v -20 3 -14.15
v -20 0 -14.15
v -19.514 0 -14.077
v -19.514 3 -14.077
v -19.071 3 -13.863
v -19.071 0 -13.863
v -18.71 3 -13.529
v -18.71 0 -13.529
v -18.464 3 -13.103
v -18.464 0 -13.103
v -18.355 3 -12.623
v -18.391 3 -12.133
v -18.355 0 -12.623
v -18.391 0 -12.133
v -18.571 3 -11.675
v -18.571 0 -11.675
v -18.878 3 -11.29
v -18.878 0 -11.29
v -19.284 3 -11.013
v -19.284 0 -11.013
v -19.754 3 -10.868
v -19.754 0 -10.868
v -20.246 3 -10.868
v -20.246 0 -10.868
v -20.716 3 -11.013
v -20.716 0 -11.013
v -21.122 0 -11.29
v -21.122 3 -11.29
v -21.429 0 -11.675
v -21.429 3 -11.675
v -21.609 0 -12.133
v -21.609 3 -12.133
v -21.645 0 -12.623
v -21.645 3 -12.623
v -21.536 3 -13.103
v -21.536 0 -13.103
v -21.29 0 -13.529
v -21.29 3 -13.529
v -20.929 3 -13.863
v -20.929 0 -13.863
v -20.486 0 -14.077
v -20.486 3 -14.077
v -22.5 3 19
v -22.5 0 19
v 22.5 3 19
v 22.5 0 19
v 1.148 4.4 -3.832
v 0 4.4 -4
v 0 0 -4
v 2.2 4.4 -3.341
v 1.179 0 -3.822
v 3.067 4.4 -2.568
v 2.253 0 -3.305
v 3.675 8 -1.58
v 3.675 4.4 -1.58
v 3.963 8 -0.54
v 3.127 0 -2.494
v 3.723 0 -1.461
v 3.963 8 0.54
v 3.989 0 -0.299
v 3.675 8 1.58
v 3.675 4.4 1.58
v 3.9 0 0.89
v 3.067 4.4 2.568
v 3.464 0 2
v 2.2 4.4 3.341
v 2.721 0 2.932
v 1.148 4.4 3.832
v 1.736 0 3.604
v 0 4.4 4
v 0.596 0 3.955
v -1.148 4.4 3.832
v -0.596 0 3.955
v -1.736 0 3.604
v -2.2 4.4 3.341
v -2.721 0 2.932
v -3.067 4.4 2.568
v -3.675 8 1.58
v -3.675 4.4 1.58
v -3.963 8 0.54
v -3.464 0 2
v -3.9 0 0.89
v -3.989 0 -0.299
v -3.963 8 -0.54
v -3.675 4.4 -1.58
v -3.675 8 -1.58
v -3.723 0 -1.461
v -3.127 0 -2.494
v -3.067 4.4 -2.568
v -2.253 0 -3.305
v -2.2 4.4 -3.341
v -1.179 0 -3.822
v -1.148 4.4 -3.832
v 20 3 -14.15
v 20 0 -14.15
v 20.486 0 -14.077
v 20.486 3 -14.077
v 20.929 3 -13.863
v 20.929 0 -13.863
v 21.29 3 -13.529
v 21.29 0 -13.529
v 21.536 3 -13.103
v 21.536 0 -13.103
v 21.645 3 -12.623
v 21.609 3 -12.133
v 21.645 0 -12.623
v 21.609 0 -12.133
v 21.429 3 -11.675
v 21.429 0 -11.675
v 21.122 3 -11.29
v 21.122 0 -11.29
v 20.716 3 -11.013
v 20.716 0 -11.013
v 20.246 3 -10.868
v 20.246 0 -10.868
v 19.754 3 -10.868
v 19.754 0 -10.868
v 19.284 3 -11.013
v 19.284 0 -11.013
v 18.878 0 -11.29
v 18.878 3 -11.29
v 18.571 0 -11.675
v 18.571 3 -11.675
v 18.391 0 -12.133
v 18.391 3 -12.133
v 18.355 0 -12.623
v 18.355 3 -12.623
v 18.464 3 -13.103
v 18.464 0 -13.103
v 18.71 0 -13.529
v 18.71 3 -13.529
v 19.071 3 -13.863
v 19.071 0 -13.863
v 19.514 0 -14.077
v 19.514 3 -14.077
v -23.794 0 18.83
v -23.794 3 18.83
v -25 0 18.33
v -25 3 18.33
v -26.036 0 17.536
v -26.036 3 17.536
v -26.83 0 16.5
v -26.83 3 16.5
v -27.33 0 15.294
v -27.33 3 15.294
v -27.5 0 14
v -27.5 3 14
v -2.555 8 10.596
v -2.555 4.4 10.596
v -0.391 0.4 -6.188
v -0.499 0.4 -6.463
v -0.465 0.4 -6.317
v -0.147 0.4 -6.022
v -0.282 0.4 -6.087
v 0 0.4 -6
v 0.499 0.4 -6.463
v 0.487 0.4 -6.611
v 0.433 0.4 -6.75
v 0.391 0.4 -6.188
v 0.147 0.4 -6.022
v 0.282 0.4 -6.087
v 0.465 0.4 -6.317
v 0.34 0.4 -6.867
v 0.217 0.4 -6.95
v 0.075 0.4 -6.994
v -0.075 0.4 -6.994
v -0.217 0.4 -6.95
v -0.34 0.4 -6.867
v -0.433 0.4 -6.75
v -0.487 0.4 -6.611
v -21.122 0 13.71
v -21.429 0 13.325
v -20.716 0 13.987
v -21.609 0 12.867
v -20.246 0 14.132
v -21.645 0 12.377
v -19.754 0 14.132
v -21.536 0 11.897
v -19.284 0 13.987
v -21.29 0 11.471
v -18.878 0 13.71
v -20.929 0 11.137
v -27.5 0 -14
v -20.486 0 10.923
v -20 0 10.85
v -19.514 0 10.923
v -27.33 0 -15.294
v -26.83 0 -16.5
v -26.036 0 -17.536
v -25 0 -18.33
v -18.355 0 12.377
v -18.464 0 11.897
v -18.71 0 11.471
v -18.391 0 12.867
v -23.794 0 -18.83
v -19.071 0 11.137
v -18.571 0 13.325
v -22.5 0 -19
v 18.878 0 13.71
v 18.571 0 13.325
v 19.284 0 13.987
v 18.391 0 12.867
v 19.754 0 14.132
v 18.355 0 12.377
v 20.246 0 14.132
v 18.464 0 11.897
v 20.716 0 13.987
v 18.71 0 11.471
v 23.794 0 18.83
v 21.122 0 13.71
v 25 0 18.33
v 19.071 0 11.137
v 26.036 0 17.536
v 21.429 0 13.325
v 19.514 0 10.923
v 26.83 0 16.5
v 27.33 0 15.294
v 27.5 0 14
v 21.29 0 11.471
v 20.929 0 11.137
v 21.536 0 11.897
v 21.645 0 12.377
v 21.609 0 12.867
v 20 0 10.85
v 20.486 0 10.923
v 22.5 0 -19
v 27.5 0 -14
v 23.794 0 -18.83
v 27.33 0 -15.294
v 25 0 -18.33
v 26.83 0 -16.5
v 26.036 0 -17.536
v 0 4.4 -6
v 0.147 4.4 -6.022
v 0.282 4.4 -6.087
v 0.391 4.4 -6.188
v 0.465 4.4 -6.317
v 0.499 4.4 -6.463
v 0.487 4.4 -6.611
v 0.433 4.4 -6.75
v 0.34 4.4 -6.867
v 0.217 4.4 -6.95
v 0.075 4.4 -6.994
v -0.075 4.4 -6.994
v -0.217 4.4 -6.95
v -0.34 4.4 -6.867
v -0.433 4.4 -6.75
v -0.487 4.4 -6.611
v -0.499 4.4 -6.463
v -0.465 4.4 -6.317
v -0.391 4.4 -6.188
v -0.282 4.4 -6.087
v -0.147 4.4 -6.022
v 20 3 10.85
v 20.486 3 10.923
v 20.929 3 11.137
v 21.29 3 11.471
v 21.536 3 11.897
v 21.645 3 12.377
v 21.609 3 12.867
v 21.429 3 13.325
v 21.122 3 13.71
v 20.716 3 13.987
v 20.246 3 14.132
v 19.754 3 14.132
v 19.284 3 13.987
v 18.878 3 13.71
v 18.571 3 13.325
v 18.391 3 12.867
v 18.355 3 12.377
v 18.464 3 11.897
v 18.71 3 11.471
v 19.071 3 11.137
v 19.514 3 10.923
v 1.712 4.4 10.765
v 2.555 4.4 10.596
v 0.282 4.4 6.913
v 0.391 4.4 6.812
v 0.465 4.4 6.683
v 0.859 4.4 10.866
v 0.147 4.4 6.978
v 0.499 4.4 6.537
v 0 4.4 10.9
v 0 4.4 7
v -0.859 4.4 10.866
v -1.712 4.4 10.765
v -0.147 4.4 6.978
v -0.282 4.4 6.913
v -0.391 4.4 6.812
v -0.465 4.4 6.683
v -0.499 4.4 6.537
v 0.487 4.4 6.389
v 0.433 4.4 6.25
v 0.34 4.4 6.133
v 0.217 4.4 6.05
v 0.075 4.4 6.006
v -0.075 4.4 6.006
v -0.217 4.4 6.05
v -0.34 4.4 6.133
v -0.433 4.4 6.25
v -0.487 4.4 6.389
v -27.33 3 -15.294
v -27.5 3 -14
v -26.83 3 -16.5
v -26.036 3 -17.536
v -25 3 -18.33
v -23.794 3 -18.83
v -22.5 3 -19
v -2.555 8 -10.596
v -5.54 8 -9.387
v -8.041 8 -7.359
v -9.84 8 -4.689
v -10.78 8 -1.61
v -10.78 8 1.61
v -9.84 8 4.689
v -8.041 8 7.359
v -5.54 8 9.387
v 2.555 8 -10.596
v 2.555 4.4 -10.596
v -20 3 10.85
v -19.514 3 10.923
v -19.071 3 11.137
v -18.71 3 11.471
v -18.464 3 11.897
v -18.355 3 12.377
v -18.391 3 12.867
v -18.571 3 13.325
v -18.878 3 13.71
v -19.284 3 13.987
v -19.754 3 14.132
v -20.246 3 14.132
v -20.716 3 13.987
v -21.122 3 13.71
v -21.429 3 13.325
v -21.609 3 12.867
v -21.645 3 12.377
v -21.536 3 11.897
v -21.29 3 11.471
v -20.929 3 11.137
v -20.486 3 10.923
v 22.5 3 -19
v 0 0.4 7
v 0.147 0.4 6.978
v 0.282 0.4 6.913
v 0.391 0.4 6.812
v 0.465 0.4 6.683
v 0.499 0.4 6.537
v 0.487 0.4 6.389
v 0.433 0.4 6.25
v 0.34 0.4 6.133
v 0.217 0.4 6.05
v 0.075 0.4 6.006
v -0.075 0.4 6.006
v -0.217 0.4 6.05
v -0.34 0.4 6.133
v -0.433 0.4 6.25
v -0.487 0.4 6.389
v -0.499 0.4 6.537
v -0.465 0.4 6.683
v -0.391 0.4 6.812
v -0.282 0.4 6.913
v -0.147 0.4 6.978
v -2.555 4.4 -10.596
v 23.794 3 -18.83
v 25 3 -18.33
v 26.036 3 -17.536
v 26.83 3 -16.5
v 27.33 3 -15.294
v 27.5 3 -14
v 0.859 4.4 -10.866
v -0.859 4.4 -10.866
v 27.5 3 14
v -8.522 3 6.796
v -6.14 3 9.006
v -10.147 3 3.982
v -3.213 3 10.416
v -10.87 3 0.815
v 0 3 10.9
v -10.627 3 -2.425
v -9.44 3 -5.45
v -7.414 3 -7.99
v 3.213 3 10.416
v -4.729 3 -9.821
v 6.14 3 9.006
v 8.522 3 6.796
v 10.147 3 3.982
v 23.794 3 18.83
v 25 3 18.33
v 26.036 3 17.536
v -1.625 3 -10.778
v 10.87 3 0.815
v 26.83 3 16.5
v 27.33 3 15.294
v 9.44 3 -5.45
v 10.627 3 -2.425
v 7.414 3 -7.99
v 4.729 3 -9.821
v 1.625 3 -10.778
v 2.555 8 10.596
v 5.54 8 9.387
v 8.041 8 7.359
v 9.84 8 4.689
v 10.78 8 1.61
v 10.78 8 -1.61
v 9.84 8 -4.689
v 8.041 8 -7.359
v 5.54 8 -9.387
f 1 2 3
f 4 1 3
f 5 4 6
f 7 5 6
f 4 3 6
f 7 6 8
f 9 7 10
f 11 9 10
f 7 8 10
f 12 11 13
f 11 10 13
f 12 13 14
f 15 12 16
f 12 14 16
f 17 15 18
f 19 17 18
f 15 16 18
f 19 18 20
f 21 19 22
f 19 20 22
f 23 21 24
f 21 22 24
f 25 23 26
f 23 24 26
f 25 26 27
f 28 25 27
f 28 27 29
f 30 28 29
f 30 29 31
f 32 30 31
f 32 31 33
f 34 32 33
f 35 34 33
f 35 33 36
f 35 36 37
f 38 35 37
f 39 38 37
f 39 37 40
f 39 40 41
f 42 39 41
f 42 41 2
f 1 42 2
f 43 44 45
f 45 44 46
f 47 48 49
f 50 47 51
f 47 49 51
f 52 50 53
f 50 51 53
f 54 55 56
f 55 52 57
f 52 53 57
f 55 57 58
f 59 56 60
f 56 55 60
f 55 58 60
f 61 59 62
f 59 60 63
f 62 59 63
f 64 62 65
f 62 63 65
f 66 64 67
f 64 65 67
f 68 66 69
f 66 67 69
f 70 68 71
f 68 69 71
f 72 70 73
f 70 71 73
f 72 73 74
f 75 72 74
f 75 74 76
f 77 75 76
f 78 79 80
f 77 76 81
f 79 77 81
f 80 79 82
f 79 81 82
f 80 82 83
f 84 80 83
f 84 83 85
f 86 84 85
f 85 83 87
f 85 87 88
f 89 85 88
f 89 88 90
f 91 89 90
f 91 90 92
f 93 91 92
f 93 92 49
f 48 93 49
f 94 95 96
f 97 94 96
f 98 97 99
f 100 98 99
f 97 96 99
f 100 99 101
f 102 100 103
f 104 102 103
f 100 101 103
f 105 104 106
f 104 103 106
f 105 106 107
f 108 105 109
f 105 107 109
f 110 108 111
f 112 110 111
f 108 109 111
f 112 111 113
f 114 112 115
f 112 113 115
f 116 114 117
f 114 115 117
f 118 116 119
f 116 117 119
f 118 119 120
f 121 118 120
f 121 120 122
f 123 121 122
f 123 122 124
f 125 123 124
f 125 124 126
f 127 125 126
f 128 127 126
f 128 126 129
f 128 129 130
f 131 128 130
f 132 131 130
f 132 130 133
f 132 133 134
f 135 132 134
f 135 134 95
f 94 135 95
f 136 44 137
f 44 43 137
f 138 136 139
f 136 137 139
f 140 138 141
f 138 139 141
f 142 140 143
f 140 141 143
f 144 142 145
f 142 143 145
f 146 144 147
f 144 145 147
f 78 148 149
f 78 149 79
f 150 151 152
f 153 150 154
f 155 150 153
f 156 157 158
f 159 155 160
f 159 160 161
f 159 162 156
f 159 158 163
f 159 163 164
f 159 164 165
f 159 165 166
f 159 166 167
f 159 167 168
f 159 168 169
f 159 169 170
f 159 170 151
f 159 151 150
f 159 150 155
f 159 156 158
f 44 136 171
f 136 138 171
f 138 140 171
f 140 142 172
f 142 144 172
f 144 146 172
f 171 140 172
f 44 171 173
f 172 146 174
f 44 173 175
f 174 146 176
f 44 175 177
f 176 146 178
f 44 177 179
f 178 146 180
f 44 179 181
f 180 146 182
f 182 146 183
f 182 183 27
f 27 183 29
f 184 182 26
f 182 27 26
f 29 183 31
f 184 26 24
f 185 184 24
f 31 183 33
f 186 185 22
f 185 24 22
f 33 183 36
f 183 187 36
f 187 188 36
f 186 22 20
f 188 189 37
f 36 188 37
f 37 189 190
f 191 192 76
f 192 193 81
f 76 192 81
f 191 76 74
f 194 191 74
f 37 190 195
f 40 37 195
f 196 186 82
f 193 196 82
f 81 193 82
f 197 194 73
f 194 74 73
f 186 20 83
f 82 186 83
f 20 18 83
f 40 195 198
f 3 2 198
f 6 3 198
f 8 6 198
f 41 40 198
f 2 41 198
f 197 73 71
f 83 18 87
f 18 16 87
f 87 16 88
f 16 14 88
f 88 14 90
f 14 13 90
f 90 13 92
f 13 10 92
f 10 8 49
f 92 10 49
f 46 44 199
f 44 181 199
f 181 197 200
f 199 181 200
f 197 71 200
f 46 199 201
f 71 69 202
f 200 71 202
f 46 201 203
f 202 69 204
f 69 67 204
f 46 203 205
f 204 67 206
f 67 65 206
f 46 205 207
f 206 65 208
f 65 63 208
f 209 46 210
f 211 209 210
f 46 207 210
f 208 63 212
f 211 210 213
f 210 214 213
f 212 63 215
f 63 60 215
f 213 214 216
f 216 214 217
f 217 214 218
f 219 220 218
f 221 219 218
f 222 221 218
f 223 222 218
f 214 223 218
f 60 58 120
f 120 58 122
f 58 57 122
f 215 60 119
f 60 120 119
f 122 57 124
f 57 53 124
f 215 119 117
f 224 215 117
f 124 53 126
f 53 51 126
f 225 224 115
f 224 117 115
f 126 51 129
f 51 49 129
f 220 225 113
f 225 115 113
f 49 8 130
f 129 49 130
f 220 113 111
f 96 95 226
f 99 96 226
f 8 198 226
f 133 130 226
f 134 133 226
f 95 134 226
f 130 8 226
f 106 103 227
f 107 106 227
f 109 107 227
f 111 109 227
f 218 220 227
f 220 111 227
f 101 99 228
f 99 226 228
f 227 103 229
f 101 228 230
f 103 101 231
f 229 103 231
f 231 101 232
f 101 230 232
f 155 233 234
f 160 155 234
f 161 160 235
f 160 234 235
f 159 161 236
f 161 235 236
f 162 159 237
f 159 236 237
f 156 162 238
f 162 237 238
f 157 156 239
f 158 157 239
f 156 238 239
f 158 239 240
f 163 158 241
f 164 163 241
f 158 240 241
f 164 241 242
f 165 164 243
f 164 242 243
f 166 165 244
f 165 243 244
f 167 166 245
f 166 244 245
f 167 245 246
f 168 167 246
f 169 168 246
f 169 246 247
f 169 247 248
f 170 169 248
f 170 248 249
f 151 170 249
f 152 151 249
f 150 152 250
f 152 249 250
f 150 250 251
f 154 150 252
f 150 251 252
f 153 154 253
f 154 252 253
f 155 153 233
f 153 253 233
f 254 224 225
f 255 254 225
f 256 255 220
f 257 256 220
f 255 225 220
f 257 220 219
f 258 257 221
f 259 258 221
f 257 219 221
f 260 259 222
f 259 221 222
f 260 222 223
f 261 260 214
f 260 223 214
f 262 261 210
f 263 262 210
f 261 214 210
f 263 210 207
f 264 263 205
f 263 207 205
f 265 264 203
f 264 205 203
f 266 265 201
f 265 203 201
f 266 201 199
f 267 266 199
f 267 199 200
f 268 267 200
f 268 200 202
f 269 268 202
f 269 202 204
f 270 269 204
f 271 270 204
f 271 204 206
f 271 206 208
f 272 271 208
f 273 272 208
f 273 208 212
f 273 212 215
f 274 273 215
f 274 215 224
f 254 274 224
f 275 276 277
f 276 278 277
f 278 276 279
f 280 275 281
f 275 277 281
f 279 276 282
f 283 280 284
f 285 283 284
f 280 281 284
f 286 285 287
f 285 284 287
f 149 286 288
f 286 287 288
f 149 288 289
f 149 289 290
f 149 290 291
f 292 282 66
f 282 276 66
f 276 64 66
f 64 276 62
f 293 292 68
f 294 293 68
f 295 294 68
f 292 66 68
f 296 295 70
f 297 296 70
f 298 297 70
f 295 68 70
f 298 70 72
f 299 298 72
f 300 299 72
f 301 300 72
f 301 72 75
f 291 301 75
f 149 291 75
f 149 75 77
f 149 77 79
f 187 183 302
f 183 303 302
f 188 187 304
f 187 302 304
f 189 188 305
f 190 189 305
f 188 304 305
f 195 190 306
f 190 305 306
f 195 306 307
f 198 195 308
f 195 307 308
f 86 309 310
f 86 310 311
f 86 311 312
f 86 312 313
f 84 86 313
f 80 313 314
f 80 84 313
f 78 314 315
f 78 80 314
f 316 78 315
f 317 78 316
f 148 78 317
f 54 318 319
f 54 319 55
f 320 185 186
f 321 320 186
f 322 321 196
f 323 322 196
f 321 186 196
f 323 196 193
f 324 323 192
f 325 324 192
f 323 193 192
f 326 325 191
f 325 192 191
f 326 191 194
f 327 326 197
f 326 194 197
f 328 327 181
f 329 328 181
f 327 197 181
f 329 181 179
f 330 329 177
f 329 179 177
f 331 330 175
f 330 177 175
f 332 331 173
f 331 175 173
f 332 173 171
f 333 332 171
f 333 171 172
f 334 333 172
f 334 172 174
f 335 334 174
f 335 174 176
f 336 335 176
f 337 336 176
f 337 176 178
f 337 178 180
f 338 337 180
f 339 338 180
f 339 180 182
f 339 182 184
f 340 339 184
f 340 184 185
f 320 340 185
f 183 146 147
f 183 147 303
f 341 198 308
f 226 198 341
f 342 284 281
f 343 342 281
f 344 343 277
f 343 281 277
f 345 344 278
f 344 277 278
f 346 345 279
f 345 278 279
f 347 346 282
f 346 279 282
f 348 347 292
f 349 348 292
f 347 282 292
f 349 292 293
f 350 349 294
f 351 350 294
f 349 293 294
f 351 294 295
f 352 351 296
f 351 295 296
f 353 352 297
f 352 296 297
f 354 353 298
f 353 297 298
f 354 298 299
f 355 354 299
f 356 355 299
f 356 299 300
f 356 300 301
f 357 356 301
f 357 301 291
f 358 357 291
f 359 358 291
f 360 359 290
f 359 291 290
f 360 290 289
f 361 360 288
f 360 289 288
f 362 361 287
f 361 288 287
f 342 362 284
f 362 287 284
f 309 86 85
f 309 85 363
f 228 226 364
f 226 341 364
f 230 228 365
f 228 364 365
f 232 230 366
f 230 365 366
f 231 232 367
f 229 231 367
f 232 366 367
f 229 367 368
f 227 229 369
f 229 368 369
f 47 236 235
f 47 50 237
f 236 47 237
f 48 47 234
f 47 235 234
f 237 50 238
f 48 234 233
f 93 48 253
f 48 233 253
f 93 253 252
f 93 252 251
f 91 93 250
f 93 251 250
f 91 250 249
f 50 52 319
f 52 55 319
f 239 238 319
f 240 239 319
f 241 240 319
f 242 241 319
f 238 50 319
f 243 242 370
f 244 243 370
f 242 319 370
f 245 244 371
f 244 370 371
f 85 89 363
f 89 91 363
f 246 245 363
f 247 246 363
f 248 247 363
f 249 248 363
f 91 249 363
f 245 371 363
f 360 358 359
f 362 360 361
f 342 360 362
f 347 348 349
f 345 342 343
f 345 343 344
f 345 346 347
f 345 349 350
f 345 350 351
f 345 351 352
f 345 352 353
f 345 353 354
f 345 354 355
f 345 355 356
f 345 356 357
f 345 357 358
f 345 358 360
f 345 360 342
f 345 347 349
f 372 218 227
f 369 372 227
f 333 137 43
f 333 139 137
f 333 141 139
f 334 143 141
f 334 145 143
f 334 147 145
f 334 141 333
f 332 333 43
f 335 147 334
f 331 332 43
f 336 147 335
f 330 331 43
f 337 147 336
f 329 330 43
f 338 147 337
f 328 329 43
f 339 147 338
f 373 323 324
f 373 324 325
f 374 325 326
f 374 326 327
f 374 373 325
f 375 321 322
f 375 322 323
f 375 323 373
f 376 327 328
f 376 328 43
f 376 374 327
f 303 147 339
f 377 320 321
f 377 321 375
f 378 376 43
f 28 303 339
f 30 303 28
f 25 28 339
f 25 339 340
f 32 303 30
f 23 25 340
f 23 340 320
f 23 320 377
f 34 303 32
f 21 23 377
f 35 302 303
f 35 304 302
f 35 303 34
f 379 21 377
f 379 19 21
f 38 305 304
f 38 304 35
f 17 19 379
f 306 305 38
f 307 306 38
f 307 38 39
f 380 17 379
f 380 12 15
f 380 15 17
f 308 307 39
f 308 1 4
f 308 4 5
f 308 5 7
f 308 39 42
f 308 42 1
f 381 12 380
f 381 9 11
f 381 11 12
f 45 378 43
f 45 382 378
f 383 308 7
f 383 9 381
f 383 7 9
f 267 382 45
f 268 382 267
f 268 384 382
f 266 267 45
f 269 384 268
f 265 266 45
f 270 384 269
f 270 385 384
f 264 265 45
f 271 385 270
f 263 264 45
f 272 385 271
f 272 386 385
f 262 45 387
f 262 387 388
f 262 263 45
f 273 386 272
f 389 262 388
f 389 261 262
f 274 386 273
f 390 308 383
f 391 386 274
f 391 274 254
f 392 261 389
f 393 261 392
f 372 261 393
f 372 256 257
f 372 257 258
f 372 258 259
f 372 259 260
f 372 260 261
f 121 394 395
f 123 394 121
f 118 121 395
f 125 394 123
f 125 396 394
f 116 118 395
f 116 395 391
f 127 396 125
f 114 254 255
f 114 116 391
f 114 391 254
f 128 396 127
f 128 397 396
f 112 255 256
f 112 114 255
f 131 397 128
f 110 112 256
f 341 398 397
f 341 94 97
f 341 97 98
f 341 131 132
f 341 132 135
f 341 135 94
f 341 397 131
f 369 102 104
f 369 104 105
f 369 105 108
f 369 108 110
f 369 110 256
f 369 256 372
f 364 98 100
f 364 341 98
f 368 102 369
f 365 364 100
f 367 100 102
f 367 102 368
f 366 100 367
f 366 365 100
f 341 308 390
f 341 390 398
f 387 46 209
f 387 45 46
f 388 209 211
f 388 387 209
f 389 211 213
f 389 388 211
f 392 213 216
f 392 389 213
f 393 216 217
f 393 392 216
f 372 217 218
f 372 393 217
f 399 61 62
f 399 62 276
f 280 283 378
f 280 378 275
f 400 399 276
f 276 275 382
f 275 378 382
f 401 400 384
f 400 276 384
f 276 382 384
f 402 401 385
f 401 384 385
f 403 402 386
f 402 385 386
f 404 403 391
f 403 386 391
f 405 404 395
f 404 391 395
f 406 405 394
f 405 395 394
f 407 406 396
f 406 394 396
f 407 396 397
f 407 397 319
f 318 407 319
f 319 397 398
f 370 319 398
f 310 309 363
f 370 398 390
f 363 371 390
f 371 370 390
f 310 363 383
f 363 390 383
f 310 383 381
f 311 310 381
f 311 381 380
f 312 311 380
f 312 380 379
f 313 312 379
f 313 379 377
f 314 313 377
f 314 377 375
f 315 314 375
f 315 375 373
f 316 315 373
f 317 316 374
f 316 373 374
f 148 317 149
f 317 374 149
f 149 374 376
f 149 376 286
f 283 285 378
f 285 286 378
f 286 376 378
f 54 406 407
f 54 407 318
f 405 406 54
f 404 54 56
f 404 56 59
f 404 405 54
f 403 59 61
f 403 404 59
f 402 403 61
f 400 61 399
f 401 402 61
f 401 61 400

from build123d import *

# Parameters (mm, degrees)
SKETCH_1_W          = 55
SKETCH_1_H          = 38
EXTRUDE_1_DEPTH     = 3
SKETCH_2_R          = 10.9
EXTRUDE_2_DEPTH     = 5
SKETCH_3_R          = 4
CUT_EXTRUDE_1_DEPTH = 35.369317712
CUT_EXTRUDE_2_DEPTH = 3.6
SKETCH_5_R          = 0.5
CUT_EXTRUDE_3_DEPTH = 4
FILLET_1_R          = 5
FILLET_2_R          = 5
FILLET_3_R          = 5
FILLET_4_R          = 5
SKETCH_6_R          = 1.65
CUT_EXTRUDE_4_DEPTH = 35.369317712


with BuildPart() as part:
    # 草图1 → 凸台-拉伸1 (new body)
    with BuildSketch(Plane(origin=(0, 0, 0), x_dir=(1, 0, 0), z_dir=(0, 1, 0))):
        Rectangle(SKETCH_1_W, SKETCH_1_H)
    extrude(amount=EXTRUDE_1_DEPTH)

    # 草图2 → 凸台-拉伸2 (add)
    with BuildSketch(Plane(origin=(0, 3, 0), x_dir=(1, 0, 0), z_dir=(0, 1, 0))):
        with Locations(Location((0, 0, 0), (0, 0, 270))):
            Circle(SKETCH_2_R)
    extrude(amount=EXTRUDE_2_DEPTH)

    # 草图3 → 切除-拉伸1 (cut, through all)
    with BuildSketch(Plane.XZ):
        with Locations(Location((0, 0, 0), (0, 0, 270))):
            Circle(SKETCH_3_R)
    extrude(amount=-CUT_EXTRUDE_1_DEPTH, mode=Mode.SUBTRACT)

    # 草图4 → 切除-拉伸2 (cut)
    with BuildSketch(Plane(origin=(0, 8, 0), x_dir=(1, 0, 0), z_dir=(0, 1, 0))):
        Polygon((3.674809939, -1.579801226), (2.341337155, -12.320336373), (-2.341337155, -12.320336373), (-3.674809939, -1.579801226), align=None)
        Polygon((-3.674809939, 1.579801226), (-2.341337155, 12.320336373), (2.341337155, 12.320336373), (3.674809939, 1.579801226), align=None)
    extrude(amount=-CUT_EXTRUDE_2_DEPTH, mode=Mode.SUBTRACT)

    # 草图5 → 切除-拉伸3 (cut)
    with BuildSketch(Plane(origin=(0, 4.4, 0), x_dir=(1, 0, 0), z_dir=(0, 1, 0))):
        with Locations(Location((0, -6.5, 0), (0, 0, 270))):
            Circle(SKETCH_5_R)
        with Locations(Location((0, 6.5, 0), (0, 0, 270))):
            Circle(SKETCH_5_R)
    extrude(amount=-CUT_EXTRUDE_3_DEPTH, mode=Mode.SUBTRACT)

    # 圆角1
    fillet_1_edges = [part.edges().sort_by_distance(p)[0] for p in [
        (27.5, 1.5, 19),
    ]]
    fillet(fillet_1_edges, radius=FILLET_1_R)

    # 圆角2
    fillet_2_edges = [part.edges().sort_by_distance(p)[0] for p in [
        (-27.5, 1.5, 19),
    ]]
    fillet(fillet_2_edges, radius=FILLET_2_R)

    # 圆角3
    fillet_3_edges = [part.edges().sort_by_distance(p)[0] for p in [
        (-27.5, 1.5, -19),
    ]]
    fillet(fillet_3_edges, radius=FILLET_3_R)

    # 圆角4
    fillet_4_edges = [part.edges().sort_by_distance(p)[0] for p in [
        (27.5, 1.5, -19),
    ]]
    fillet(fillet_4_edges, radius=FILLET_4_R)

    # 草图6 → 切除-拉伸4 (cut, through all)
    with BuildSketch(Plane.XZ):
        with Locations(Location((-20, 12.5, 0), (0, 0, 270))):
            Circle(SKETCH_6_R)
        with Locations(Location((20, 12.5, 0), (0, 0, 270))):
            Circle(SKETCH_6_R)
        with Locations(Location((20, -12.5, 0), (0, 0, 270))):
            Circle(SKETCH_6_R)
        with Locations(Location((-20, -12.5, 0), (0, 0, 270))):
            Circle(SKETCH_6_R)
    extrude(amount=-CUT_EXTRUDE_4_DEPTH, mode=Mode.SUBTRACT)


solid = part.part
